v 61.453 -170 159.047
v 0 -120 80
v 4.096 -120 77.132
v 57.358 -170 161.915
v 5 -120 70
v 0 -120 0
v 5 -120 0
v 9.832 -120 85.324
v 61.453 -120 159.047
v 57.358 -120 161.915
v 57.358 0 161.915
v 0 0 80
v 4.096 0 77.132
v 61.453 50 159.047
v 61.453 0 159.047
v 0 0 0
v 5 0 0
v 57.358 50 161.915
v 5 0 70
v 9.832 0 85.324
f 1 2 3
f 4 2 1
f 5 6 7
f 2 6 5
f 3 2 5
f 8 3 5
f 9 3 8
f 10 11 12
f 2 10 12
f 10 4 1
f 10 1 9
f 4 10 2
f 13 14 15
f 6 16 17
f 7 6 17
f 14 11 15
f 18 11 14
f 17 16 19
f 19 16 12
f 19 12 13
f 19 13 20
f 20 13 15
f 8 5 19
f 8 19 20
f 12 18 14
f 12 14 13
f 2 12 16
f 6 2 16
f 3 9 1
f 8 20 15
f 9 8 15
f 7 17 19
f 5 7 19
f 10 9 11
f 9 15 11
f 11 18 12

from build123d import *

# Parameters (mm, degrees)
F1_DEPTH = 120
F3_DEPTH = 5
F4_DEPTH = 5


with BuildPart() as f1:
    # F0 (on Front) → F1 (new body)
    with BuildSketch(Plane.XZ):
        Polygon((0, 80), (0, 0), (5, 0), (5, 70), (9.831525, 85.323638), (61.453404, 159.047322), (57.357644, 161.915204), align=None)
    extrude(amount=F1_DEPTH)

    # F2 (on face) → F3 (join)
    with BuildSketch(Plane(origin=(-37.587705, 0, 26.319194), x_dir=(0, -1, 0), z_dir=(-0.819152, 0, 0.573576))):
        Polygon((0, 65.532164), (0, 165.532164), (-50, 165.532164), align=None)
    extrude(amount=-F3_DEPTH)

    # F2 (on face) → F4 (join)
    with BuildSketch(Plane(origin=(-37.587705, 0, 26.319194), x_dir=(0, -1, 0), z_dir=(-0.819152, 0, 0.573576))):
        Polygon((170, 165.532164), (120, 165.532164), (120, 65.532164), align=None)
    extrude(amount=-F4_DEPTH)


solid = f1.part
